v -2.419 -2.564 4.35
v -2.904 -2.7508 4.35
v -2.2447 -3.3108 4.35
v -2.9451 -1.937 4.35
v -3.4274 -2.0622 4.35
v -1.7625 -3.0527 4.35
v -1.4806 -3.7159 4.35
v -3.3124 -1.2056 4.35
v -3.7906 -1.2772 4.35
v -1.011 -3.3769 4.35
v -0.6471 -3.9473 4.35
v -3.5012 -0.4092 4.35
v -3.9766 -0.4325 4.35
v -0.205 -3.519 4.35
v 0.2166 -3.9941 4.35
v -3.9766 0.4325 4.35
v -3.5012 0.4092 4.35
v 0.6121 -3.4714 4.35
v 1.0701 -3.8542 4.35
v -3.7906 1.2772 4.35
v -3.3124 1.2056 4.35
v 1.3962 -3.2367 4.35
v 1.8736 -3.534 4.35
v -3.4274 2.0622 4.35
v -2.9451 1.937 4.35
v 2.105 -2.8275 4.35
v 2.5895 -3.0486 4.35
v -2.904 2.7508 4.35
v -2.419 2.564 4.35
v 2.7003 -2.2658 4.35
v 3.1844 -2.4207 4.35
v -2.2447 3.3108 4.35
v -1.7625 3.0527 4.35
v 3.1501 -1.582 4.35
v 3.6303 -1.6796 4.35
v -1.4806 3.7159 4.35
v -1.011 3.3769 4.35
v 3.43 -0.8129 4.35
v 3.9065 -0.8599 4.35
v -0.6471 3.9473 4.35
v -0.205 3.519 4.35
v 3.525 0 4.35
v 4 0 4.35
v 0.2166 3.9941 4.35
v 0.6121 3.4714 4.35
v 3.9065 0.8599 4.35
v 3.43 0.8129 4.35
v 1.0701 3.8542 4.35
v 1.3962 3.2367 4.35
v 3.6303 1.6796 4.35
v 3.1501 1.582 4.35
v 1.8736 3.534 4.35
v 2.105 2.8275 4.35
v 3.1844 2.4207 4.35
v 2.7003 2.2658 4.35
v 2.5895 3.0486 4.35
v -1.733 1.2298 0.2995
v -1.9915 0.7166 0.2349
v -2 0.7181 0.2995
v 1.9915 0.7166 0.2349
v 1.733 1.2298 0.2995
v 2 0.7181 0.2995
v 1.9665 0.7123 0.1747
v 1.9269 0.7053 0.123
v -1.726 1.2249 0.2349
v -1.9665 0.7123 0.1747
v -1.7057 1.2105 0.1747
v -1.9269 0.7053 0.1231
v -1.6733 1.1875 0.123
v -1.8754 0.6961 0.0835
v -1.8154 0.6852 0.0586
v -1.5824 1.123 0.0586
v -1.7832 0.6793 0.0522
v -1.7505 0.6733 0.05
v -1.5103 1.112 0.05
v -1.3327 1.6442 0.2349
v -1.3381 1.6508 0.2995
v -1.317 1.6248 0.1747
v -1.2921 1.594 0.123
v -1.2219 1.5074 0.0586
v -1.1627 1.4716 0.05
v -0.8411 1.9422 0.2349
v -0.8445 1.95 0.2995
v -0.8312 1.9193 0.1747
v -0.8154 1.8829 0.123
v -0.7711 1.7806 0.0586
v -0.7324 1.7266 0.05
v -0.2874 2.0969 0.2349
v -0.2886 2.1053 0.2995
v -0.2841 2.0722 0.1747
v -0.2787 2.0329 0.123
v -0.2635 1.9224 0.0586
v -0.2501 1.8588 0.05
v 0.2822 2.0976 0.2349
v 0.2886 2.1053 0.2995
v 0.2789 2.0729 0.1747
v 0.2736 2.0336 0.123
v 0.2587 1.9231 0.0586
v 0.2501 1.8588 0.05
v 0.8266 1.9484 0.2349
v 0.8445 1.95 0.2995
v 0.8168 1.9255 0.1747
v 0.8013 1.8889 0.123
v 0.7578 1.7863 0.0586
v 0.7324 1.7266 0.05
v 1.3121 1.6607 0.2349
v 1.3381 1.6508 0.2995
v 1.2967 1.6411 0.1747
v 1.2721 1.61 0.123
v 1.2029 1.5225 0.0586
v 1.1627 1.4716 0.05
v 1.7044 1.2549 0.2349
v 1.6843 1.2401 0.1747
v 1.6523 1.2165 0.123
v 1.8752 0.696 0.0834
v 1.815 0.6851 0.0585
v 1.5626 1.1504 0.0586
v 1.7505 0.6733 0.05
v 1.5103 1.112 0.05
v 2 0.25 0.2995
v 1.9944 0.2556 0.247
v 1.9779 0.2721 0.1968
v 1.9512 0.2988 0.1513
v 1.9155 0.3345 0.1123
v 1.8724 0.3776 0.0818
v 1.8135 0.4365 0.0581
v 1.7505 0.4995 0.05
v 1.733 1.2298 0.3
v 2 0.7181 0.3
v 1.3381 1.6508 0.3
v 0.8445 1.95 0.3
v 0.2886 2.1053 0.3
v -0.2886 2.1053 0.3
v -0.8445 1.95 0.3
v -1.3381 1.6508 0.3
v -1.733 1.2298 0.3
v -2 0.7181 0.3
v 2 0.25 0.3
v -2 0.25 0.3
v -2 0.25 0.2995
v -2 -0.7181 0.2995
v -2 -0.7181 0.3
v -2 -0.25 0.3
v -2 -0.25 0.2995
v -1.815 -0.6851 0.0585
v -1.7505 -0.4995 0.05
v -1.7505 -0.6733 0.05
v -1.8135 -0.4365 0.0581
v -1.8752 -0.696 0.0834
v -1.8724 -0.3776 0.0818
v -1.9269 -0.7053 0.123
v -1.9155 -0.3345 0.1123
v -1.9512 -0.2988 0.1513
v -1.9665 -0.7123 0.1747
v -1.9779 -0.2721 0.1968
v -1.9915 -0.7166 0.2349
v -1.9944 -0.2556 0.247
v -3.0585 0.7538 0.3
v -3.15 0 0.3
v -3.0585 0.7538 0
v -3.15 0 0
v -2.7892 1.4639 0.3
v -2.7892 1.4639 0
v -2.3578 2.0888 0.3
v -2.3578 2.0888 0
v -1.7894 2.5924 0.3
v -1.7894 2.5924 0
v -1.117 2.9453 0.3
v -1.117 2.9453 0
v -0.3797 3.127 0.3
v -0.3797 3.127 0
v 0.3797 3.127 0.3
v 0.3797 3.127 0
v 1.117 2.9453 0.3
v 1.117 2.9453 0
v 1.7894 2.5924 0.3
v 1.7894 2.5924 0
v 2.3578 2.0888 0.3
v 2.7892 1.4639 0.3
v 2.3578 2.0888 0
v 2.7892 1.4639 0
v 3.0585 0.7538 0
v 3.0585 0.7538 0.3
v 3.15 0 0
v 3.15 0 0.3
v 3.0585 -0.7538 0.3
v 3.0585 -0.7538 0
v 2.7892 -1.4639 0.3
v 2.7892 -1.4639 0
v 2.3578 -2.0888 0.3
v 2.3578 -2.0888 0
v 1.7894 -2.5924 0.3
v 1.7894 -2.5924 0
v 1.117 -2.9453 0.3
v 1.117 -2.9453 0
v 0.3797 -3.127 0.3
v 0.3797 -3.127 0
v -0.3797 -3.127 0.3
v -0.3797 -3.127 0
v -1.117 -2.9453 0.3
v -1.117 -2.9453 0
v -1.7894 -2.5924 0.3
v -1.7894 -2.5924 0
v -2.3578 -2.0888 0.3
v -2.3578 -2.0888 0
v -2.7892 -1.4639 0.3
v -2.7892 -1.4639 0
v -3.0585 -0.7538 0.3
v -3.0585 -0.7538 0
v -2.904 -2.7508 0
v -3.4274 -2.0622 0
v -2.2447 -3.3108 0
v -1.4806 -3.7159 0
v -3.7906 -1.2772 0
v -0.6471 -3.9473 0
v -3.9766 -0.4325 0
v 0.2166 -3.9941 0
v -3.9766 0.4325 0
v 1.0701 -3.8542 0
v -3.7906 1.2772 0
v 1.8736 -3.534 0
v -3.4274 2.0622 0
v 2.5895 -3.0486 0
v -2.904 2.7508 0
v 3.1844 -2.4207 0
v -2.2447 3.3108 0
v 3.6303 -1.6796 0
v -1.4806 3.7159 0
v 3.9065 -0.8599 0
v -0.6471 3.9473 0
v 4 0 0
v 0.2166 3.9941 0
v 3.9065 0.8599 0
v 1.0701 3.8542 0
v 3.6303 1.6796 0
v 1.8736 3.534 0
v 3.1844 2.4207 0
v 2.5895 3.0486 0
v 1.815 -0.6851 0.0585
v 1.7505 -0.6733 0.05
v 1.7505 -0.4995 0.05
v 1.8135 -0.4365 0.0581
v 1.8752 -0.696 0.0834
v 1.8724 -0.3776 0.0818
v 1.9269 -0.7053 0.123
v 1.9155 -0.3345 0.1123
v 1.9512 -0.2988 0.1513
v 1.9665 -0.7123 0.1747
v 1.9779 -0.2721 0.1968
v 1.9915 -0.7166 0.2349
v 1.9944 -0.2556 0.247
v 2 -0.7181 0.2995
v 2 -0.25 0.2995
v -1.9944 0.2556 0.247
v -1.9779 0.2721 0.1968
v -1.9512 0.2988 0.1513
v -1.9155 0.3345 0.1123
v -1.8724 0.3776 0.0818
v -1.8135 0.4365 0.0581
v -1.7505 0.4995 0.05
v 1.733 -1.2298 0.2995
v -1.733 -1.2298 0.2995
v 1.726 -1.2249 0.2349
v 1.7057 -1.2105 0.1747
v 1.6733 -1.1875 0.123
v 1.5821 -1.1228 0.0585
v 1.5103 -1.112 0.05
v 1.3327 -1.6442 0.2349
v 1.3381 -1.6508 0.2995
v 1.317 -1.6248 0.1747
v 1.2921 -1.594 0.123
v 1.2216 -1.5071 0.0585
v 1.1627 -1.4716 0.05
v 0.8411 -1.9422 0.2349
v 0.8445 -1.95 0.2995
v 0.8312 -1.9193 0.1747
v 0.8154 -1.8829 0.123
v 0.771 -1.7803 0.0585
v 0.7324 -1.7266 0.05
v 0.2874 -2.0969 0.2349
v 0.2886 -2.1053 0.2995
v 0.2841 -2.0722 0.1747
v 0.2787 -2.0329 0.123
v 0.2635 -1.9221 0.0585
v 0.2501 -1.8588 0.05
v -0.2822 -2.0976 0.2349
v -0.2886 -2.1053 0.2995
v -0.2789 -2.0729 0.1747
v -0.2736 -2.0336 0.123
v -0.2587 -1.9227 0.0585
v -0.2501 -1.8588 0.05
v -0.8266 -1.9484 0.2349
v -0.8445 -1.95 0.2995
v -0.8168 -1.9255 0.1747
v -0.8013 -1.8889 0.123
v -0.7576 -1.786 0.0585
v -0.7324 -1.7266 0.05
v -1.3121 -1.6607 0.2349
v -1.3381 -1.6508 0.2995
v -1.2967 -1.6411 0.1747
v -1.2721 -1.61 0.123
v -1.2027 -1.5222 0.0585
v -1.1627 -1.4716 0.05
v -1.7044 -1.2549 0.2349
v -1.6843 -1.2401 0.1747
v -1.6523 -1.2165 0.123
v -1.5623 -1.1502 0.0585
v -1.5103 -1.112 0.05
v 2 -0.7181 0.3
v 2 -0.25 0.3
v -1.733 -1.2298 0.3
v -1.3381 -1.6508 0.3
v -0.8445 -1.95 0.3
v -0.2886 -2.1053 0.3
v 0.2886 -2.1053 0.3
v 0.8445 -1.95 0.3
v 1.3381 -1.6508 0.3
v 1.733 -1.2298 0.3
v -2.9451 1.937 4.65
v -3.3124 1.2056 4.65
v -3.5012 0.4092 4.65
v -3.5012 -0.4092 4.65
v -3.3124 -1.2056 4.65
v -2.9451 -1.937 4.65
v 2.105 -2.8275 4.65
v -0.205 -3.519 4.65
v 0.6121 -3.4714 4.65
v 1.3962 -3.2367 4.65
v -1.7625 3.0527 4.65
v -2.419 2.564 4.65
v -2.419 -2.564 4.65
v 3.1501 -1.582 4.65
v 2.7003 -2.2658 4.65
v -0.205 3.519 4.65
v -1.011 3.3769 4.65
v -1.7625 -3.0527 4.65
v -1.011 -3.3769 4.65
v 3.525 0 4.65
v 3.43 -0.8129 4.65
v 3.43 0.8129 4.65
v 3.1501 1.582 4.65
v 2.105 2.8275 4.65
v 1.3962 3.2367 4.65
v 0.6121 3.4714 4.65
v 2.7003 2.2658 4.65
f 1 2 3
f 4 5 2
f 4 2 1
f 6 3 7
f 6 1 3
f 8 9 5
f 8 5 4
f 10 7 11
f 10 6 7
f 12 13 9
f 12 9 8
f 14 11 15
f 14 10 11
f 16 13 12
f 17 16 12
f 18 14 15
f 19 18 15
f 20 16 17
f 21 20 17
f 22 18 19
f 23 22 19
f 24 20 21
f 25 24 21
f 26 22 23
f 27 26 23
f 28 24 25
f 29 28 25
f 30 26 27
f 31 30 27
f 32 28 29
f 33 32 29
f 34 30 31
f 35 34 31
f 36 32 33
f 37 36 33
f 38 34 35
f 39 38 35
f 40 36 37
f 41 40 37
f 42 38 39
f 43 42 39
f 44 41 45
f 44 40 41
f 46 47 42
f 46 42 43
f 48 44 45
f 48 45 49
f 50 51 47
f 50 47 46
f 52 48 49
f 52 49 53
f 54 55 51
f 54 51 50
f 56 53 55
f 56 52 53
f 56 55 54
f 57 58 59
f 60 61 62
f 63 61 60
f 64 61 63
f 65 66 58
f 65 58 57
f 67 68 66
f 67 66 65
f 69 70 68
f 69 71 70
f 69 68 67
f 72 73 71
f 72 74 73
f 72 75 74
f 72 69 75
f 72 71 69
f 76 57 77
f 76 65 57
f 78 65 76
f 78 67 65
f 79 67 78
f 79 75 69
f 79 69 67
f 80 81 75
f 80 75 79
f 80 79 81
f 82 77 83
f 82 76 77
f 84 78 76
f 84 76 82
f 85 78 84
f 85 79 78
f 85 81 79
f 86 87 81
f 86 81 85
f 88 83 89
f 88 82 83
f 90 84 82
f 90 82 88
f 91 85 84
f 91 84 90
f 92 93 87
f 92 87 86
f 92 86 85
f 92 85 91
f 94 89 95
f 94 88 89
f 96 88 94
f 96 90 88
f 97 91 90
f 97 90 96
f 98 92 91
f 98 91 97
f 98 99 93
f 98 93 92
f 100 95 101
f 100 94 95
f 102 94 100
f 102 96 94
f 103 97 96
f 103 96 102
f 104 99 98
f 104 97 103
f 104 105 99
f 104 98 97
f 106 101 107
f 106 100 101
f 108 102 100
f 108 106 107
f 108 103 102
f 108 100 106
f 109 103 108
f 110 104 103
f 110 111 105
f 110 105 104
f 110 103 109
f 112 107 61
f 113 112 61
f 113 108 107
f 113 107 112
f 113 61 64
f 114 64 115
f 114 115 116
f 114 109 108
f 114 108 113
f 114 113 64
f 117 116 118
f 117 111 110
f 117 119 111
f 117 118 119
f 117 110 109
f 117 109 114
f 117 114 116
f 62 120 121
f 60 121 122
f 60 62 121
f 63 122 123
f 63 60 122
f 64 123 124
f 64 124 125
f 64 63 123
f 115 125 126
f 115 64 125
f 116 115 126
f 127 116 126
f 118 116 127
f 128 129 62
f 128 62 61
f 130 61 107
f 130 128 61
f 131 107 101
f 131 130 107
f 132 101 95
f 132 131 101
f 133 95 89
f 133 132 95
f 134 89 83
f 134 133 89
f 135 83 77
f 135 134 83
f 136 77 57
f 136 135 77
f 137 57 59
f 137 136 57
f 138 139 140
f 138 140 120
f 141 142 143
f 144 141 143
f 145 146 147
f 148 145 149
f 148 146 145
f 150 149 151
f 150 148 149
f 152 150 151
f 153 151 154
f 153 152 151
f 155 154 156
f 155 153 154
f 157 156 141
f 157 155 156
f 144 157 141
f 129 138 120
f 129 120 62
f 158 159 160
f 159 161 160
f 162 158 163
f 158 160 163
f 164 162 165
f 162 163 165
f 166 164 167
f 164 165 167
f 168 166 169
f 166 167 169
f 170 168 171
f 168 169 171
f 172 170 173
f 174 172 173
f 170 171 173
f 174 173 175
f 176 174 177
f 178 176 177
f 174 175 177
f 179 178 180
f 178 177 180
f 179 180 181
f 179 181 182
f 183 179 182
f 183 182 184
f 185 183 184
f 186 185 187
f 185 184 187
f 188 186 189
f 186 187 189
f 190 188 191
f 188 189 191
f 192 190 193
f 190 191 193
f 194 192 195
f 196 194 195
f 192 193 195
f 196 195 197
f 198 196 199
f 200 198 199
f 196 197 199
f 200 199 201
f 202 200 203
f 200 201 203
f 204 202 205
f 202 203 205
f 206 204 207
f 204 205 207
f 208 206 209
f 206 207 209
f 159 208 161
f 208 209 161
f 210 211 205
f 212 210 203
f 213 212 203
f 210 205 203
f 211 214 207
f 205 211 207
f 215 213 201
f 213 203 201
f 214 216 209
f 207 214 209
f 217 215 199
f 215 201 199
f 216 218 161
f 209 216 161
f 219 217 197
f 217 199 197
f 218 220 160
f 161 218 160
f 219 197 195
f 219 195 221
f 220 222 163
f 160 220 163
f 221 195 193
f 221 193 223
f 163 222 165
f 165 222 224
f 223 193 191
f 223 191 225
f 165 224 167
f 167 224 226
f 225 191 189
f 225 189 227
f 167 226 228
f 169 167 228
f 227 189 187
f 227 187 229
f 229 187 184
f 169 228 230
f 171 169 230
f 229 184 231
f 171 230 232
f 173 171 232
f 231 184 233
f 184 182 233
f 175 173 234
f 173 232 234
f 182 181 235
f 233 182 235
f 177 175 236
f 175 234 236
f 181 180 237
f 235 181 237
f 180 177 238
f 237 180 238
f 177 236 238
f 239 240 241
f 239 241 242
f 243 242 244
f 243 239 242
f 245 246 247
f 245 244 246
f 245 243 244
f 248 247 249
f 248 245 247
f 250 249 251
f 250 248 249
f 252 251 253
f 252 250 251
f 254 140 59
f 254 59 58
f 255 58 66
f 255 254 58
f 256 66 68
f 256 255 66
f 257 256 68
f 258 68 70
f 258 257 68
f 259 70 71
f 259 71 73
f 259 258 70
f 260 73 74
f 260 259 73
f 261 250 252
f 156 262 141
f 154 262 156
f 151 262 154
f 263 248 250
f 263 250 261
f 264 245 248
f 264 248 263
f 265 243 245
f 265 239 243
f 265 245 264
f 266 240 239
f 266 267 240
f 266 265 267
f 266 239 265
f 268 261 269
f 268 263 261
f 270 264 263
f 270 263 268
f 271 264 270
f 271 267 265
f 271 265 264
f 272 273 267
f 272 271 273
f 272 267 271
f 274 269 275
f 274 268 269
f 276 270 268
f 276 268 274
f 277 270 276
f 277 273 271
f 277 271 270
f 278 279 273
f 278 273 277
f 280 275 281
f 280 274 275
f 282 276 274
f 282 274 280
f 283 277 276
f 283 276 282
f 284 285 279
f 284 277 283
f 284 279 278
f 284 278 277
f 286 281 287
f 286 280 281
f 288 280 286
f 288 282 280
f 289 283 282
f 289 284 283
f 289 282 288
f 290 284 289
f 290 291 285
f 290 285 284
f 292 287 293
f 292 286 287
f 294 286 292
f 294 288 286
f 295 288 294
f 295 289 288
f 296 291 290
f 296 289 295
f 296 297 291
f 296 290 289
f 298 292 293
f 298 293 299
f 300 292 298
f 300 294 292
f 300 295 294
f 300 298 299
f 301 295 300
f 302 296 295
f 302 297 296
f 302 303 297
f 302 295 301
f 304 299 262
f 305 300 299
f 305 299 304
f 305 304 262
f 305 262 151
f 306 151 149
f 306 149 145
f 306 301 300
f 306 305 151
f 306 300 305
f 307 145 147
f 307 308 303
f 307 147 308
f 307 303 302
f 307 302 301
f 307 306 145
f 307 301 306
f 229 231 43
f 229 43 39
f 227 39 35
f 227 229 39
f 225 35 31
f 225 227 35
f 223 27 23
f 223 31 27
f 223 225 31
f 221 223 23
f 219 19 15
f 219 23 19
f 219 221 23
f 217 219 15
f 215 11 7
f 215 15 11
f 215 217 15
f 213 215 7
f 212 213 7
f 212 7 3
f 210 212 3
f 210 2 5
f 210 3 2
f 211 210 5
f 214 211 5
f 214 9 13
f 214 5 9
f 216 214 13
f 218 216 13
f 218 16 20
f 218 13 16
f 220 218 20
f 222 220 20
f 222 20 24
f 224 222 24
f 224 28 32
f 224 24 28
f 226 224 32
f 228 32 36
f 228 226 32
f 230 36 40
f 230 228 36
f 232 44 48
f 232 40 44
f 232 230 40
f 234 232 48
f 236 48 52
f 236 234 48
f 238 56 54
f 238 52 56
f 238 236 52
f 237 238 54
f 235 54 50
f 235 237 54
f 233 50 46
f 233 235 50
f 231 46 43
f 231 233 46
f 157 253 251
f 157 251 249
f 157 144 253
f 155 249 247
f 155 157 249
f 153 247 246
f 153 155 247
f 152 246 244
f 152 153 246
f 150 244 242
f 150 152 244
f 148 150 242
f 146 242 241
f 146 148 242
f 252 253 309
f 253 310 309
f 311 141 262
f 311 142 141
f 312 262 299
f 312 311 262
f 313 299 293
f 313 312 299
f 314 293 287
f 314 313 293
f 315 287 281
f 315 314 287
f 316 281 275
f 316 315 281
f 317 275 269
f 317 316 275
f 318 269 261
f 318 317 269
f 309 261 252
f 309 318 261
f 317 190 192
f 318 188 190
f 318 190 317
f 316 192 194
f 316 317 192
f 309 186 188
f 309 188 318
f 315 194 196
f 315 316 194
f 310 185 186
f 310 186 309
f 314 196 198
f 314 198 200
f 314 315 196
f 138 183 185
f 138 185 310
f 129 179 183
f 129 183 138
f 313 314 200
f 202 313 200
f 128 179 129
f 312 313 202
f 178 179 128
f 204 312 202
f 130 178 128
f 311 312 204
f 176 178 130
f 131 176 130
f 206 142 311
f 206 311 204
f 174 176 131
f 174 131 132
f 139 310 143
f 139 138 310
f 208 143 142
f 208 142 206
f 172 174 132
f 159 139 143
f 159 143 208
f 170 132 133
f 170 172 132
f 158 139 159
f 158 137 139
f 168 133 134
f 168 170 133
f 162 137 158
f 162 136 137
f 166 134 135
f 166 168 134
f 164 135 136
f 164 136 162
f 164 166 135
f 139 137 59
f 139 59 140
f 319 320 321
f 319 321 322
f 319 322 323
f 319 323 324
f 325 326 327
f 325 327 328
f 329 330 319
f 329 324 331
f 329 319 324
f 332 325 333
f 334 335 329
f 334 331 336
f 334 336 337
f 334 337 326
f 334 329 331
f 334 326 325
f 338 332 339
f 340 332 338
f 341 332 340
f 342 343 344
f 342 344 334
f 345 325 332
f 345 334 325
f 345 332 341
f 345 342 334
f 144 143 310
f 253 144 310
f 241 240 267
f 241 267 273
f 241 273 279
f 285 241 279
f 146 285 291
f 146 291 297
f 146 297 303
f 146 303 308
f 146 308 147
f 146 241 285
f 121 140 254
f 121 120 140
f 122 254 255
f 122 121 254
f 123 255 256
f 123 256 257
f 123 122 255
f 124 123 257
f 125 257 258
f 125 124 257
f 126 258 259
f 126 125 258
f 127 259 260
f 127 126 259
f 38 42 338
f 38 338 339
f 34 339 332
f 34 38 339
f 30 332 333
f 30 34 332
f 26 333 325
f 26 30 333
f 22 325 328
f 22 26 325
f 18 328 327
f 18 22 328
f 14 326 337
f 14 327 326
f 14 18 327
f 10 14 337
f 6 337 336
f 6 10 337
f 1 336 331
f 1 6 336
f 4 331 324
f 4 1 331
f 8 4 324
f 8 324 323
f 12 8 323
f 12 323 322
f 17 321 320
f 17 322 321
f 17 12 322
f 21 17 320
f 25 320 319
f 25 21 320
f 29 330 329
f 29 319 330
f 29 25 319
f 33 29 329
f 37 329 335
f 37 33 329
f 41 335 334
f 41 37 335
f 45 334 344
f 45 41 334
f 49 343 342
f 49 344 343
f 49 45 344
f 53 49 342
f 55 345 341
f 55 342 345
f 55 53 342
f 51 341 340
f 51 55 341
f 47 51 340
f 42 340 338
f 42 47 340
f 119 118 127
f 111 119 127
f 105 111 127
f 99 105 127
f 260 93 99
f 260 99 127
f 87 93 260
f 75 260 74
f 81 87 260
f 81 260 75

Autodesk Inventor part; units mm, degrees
ref_plane "YZ Plane" through (0, 0, 0) normal (1, 0, 0) x (0, 1, 0)
ref_plane "XZ Plane" through (0, 0, 0) normal (0, 1, 0) x (-1, 0, 0)
ref_plane "XY Plane" through (0, 0, 0) normal (0, 0, 1) x (1, 0, 0)
sketch "Sketch1" plane through (0, 0, 0) normal (0, 0, 1) x (1, 0, 0)
  circle A0 centre (0, 0) radius 4
  dimension "d0" = 8
extrude "Extrusion1" add sketch "Sketch1" along normal blind 4.35
sketch "Sketch2" plane through (0, 0, 4.35) normal (0, 0, 1) x (1, 0, 0)
  circle A0 centre (0, 0) radius 3.525
  circle A1 centre (0, 0) radius 4 projected
  dimension "d16" = 7.05
extrude "Extrusion2" add sketch "Sketch2" along normal blind 0.3 contours A0
sketch "Sketch3" plane through (0, 0, 0) normal (0, 0, -1) x (-1, 0, 0)
  circle A0 centre (0, 0) radius 3.15
  circle A1 centre (0, 0) radius 4 projected
  dimension "d17" = 6.3
extrude "Extrusion3" cut sketch "Sketch3" against normal blind 0.3 contours A0
sketch "Sketch4" plane through (0, 0, 0.3) normal (0, 0, -1) x (-1, 0, 0)
  arc A0 (2, 0.7181) -> (-2, 0.7181) centre (0, 0) ccw
  line L0 (2, 0.7181) -> (2, 0.25)
  line L1 (2, 0.25) -> (0, 0.25)
  line L2 (-2, 0.25) -> (-2, 0.7181)
  circle A1 centre (0, 0) radius 3.525 construction
  circle A2 centre (0, 0) radius 3.15 construction
  line L3 (0, 0) -> (0, 3.15) construction
  line L4 (0, 0.25) -> (-2, 0.25)
  line L5 (0, 0) -> (3.15, 0) construction
  arc A3 (-2, -0.7181) -> (2, -0.7181) centre (0, 0) ccw
  line L6 (2, -0.7181) -> (2, -0.25)
  line L7 (2, -0.25) -> (0, -0.25)
  line L8 (-2, -0.25) -> (-2, -0.7181)
  line L9 (0, -0.25) -> (-2, -0.25)
  dimension "d9" = 1.4
  dimension "d10" = 2
  dimension "d12" = 0.5
extrude "Extrusion4" add sketch "Sketch4" along normal blind 0.25
fillet "Fillet1" radius 0.25 8 edges at (0, 2.125, 0.05) (2, 0.484, 0.05) (0, 0.25, 0.05) (-2, 0.484, 0.05) (0, -0.25, 0.05) (2, -0.484, 0.05) (0, -2.125, 0.05) (-2, -0.484, 0.05)
equation "\"d9\" = leadInset"
equation "\"d10\" = 0.5 * leadWidth"
equation "\"d12\" = leadSeparation"
equation "\"d13\" = leadExtrusion"
equation "\"d15\" = leadExtrusion"
equation "\"membraneInset\" = 0.25"
equation "\"backplateInset\" = membraneInset"
equation "\"backplateExtrusion\" = 0.125"
equation "\"leadInset\" = 1.4"
equation "\"leadSeparation\" = 0.5"
equation "\"leadWidth\" = 4"
equation "\"leadExtrusion\" = 2 * backplateExtrusion"
properties part number "Mic_Unidirectional"
